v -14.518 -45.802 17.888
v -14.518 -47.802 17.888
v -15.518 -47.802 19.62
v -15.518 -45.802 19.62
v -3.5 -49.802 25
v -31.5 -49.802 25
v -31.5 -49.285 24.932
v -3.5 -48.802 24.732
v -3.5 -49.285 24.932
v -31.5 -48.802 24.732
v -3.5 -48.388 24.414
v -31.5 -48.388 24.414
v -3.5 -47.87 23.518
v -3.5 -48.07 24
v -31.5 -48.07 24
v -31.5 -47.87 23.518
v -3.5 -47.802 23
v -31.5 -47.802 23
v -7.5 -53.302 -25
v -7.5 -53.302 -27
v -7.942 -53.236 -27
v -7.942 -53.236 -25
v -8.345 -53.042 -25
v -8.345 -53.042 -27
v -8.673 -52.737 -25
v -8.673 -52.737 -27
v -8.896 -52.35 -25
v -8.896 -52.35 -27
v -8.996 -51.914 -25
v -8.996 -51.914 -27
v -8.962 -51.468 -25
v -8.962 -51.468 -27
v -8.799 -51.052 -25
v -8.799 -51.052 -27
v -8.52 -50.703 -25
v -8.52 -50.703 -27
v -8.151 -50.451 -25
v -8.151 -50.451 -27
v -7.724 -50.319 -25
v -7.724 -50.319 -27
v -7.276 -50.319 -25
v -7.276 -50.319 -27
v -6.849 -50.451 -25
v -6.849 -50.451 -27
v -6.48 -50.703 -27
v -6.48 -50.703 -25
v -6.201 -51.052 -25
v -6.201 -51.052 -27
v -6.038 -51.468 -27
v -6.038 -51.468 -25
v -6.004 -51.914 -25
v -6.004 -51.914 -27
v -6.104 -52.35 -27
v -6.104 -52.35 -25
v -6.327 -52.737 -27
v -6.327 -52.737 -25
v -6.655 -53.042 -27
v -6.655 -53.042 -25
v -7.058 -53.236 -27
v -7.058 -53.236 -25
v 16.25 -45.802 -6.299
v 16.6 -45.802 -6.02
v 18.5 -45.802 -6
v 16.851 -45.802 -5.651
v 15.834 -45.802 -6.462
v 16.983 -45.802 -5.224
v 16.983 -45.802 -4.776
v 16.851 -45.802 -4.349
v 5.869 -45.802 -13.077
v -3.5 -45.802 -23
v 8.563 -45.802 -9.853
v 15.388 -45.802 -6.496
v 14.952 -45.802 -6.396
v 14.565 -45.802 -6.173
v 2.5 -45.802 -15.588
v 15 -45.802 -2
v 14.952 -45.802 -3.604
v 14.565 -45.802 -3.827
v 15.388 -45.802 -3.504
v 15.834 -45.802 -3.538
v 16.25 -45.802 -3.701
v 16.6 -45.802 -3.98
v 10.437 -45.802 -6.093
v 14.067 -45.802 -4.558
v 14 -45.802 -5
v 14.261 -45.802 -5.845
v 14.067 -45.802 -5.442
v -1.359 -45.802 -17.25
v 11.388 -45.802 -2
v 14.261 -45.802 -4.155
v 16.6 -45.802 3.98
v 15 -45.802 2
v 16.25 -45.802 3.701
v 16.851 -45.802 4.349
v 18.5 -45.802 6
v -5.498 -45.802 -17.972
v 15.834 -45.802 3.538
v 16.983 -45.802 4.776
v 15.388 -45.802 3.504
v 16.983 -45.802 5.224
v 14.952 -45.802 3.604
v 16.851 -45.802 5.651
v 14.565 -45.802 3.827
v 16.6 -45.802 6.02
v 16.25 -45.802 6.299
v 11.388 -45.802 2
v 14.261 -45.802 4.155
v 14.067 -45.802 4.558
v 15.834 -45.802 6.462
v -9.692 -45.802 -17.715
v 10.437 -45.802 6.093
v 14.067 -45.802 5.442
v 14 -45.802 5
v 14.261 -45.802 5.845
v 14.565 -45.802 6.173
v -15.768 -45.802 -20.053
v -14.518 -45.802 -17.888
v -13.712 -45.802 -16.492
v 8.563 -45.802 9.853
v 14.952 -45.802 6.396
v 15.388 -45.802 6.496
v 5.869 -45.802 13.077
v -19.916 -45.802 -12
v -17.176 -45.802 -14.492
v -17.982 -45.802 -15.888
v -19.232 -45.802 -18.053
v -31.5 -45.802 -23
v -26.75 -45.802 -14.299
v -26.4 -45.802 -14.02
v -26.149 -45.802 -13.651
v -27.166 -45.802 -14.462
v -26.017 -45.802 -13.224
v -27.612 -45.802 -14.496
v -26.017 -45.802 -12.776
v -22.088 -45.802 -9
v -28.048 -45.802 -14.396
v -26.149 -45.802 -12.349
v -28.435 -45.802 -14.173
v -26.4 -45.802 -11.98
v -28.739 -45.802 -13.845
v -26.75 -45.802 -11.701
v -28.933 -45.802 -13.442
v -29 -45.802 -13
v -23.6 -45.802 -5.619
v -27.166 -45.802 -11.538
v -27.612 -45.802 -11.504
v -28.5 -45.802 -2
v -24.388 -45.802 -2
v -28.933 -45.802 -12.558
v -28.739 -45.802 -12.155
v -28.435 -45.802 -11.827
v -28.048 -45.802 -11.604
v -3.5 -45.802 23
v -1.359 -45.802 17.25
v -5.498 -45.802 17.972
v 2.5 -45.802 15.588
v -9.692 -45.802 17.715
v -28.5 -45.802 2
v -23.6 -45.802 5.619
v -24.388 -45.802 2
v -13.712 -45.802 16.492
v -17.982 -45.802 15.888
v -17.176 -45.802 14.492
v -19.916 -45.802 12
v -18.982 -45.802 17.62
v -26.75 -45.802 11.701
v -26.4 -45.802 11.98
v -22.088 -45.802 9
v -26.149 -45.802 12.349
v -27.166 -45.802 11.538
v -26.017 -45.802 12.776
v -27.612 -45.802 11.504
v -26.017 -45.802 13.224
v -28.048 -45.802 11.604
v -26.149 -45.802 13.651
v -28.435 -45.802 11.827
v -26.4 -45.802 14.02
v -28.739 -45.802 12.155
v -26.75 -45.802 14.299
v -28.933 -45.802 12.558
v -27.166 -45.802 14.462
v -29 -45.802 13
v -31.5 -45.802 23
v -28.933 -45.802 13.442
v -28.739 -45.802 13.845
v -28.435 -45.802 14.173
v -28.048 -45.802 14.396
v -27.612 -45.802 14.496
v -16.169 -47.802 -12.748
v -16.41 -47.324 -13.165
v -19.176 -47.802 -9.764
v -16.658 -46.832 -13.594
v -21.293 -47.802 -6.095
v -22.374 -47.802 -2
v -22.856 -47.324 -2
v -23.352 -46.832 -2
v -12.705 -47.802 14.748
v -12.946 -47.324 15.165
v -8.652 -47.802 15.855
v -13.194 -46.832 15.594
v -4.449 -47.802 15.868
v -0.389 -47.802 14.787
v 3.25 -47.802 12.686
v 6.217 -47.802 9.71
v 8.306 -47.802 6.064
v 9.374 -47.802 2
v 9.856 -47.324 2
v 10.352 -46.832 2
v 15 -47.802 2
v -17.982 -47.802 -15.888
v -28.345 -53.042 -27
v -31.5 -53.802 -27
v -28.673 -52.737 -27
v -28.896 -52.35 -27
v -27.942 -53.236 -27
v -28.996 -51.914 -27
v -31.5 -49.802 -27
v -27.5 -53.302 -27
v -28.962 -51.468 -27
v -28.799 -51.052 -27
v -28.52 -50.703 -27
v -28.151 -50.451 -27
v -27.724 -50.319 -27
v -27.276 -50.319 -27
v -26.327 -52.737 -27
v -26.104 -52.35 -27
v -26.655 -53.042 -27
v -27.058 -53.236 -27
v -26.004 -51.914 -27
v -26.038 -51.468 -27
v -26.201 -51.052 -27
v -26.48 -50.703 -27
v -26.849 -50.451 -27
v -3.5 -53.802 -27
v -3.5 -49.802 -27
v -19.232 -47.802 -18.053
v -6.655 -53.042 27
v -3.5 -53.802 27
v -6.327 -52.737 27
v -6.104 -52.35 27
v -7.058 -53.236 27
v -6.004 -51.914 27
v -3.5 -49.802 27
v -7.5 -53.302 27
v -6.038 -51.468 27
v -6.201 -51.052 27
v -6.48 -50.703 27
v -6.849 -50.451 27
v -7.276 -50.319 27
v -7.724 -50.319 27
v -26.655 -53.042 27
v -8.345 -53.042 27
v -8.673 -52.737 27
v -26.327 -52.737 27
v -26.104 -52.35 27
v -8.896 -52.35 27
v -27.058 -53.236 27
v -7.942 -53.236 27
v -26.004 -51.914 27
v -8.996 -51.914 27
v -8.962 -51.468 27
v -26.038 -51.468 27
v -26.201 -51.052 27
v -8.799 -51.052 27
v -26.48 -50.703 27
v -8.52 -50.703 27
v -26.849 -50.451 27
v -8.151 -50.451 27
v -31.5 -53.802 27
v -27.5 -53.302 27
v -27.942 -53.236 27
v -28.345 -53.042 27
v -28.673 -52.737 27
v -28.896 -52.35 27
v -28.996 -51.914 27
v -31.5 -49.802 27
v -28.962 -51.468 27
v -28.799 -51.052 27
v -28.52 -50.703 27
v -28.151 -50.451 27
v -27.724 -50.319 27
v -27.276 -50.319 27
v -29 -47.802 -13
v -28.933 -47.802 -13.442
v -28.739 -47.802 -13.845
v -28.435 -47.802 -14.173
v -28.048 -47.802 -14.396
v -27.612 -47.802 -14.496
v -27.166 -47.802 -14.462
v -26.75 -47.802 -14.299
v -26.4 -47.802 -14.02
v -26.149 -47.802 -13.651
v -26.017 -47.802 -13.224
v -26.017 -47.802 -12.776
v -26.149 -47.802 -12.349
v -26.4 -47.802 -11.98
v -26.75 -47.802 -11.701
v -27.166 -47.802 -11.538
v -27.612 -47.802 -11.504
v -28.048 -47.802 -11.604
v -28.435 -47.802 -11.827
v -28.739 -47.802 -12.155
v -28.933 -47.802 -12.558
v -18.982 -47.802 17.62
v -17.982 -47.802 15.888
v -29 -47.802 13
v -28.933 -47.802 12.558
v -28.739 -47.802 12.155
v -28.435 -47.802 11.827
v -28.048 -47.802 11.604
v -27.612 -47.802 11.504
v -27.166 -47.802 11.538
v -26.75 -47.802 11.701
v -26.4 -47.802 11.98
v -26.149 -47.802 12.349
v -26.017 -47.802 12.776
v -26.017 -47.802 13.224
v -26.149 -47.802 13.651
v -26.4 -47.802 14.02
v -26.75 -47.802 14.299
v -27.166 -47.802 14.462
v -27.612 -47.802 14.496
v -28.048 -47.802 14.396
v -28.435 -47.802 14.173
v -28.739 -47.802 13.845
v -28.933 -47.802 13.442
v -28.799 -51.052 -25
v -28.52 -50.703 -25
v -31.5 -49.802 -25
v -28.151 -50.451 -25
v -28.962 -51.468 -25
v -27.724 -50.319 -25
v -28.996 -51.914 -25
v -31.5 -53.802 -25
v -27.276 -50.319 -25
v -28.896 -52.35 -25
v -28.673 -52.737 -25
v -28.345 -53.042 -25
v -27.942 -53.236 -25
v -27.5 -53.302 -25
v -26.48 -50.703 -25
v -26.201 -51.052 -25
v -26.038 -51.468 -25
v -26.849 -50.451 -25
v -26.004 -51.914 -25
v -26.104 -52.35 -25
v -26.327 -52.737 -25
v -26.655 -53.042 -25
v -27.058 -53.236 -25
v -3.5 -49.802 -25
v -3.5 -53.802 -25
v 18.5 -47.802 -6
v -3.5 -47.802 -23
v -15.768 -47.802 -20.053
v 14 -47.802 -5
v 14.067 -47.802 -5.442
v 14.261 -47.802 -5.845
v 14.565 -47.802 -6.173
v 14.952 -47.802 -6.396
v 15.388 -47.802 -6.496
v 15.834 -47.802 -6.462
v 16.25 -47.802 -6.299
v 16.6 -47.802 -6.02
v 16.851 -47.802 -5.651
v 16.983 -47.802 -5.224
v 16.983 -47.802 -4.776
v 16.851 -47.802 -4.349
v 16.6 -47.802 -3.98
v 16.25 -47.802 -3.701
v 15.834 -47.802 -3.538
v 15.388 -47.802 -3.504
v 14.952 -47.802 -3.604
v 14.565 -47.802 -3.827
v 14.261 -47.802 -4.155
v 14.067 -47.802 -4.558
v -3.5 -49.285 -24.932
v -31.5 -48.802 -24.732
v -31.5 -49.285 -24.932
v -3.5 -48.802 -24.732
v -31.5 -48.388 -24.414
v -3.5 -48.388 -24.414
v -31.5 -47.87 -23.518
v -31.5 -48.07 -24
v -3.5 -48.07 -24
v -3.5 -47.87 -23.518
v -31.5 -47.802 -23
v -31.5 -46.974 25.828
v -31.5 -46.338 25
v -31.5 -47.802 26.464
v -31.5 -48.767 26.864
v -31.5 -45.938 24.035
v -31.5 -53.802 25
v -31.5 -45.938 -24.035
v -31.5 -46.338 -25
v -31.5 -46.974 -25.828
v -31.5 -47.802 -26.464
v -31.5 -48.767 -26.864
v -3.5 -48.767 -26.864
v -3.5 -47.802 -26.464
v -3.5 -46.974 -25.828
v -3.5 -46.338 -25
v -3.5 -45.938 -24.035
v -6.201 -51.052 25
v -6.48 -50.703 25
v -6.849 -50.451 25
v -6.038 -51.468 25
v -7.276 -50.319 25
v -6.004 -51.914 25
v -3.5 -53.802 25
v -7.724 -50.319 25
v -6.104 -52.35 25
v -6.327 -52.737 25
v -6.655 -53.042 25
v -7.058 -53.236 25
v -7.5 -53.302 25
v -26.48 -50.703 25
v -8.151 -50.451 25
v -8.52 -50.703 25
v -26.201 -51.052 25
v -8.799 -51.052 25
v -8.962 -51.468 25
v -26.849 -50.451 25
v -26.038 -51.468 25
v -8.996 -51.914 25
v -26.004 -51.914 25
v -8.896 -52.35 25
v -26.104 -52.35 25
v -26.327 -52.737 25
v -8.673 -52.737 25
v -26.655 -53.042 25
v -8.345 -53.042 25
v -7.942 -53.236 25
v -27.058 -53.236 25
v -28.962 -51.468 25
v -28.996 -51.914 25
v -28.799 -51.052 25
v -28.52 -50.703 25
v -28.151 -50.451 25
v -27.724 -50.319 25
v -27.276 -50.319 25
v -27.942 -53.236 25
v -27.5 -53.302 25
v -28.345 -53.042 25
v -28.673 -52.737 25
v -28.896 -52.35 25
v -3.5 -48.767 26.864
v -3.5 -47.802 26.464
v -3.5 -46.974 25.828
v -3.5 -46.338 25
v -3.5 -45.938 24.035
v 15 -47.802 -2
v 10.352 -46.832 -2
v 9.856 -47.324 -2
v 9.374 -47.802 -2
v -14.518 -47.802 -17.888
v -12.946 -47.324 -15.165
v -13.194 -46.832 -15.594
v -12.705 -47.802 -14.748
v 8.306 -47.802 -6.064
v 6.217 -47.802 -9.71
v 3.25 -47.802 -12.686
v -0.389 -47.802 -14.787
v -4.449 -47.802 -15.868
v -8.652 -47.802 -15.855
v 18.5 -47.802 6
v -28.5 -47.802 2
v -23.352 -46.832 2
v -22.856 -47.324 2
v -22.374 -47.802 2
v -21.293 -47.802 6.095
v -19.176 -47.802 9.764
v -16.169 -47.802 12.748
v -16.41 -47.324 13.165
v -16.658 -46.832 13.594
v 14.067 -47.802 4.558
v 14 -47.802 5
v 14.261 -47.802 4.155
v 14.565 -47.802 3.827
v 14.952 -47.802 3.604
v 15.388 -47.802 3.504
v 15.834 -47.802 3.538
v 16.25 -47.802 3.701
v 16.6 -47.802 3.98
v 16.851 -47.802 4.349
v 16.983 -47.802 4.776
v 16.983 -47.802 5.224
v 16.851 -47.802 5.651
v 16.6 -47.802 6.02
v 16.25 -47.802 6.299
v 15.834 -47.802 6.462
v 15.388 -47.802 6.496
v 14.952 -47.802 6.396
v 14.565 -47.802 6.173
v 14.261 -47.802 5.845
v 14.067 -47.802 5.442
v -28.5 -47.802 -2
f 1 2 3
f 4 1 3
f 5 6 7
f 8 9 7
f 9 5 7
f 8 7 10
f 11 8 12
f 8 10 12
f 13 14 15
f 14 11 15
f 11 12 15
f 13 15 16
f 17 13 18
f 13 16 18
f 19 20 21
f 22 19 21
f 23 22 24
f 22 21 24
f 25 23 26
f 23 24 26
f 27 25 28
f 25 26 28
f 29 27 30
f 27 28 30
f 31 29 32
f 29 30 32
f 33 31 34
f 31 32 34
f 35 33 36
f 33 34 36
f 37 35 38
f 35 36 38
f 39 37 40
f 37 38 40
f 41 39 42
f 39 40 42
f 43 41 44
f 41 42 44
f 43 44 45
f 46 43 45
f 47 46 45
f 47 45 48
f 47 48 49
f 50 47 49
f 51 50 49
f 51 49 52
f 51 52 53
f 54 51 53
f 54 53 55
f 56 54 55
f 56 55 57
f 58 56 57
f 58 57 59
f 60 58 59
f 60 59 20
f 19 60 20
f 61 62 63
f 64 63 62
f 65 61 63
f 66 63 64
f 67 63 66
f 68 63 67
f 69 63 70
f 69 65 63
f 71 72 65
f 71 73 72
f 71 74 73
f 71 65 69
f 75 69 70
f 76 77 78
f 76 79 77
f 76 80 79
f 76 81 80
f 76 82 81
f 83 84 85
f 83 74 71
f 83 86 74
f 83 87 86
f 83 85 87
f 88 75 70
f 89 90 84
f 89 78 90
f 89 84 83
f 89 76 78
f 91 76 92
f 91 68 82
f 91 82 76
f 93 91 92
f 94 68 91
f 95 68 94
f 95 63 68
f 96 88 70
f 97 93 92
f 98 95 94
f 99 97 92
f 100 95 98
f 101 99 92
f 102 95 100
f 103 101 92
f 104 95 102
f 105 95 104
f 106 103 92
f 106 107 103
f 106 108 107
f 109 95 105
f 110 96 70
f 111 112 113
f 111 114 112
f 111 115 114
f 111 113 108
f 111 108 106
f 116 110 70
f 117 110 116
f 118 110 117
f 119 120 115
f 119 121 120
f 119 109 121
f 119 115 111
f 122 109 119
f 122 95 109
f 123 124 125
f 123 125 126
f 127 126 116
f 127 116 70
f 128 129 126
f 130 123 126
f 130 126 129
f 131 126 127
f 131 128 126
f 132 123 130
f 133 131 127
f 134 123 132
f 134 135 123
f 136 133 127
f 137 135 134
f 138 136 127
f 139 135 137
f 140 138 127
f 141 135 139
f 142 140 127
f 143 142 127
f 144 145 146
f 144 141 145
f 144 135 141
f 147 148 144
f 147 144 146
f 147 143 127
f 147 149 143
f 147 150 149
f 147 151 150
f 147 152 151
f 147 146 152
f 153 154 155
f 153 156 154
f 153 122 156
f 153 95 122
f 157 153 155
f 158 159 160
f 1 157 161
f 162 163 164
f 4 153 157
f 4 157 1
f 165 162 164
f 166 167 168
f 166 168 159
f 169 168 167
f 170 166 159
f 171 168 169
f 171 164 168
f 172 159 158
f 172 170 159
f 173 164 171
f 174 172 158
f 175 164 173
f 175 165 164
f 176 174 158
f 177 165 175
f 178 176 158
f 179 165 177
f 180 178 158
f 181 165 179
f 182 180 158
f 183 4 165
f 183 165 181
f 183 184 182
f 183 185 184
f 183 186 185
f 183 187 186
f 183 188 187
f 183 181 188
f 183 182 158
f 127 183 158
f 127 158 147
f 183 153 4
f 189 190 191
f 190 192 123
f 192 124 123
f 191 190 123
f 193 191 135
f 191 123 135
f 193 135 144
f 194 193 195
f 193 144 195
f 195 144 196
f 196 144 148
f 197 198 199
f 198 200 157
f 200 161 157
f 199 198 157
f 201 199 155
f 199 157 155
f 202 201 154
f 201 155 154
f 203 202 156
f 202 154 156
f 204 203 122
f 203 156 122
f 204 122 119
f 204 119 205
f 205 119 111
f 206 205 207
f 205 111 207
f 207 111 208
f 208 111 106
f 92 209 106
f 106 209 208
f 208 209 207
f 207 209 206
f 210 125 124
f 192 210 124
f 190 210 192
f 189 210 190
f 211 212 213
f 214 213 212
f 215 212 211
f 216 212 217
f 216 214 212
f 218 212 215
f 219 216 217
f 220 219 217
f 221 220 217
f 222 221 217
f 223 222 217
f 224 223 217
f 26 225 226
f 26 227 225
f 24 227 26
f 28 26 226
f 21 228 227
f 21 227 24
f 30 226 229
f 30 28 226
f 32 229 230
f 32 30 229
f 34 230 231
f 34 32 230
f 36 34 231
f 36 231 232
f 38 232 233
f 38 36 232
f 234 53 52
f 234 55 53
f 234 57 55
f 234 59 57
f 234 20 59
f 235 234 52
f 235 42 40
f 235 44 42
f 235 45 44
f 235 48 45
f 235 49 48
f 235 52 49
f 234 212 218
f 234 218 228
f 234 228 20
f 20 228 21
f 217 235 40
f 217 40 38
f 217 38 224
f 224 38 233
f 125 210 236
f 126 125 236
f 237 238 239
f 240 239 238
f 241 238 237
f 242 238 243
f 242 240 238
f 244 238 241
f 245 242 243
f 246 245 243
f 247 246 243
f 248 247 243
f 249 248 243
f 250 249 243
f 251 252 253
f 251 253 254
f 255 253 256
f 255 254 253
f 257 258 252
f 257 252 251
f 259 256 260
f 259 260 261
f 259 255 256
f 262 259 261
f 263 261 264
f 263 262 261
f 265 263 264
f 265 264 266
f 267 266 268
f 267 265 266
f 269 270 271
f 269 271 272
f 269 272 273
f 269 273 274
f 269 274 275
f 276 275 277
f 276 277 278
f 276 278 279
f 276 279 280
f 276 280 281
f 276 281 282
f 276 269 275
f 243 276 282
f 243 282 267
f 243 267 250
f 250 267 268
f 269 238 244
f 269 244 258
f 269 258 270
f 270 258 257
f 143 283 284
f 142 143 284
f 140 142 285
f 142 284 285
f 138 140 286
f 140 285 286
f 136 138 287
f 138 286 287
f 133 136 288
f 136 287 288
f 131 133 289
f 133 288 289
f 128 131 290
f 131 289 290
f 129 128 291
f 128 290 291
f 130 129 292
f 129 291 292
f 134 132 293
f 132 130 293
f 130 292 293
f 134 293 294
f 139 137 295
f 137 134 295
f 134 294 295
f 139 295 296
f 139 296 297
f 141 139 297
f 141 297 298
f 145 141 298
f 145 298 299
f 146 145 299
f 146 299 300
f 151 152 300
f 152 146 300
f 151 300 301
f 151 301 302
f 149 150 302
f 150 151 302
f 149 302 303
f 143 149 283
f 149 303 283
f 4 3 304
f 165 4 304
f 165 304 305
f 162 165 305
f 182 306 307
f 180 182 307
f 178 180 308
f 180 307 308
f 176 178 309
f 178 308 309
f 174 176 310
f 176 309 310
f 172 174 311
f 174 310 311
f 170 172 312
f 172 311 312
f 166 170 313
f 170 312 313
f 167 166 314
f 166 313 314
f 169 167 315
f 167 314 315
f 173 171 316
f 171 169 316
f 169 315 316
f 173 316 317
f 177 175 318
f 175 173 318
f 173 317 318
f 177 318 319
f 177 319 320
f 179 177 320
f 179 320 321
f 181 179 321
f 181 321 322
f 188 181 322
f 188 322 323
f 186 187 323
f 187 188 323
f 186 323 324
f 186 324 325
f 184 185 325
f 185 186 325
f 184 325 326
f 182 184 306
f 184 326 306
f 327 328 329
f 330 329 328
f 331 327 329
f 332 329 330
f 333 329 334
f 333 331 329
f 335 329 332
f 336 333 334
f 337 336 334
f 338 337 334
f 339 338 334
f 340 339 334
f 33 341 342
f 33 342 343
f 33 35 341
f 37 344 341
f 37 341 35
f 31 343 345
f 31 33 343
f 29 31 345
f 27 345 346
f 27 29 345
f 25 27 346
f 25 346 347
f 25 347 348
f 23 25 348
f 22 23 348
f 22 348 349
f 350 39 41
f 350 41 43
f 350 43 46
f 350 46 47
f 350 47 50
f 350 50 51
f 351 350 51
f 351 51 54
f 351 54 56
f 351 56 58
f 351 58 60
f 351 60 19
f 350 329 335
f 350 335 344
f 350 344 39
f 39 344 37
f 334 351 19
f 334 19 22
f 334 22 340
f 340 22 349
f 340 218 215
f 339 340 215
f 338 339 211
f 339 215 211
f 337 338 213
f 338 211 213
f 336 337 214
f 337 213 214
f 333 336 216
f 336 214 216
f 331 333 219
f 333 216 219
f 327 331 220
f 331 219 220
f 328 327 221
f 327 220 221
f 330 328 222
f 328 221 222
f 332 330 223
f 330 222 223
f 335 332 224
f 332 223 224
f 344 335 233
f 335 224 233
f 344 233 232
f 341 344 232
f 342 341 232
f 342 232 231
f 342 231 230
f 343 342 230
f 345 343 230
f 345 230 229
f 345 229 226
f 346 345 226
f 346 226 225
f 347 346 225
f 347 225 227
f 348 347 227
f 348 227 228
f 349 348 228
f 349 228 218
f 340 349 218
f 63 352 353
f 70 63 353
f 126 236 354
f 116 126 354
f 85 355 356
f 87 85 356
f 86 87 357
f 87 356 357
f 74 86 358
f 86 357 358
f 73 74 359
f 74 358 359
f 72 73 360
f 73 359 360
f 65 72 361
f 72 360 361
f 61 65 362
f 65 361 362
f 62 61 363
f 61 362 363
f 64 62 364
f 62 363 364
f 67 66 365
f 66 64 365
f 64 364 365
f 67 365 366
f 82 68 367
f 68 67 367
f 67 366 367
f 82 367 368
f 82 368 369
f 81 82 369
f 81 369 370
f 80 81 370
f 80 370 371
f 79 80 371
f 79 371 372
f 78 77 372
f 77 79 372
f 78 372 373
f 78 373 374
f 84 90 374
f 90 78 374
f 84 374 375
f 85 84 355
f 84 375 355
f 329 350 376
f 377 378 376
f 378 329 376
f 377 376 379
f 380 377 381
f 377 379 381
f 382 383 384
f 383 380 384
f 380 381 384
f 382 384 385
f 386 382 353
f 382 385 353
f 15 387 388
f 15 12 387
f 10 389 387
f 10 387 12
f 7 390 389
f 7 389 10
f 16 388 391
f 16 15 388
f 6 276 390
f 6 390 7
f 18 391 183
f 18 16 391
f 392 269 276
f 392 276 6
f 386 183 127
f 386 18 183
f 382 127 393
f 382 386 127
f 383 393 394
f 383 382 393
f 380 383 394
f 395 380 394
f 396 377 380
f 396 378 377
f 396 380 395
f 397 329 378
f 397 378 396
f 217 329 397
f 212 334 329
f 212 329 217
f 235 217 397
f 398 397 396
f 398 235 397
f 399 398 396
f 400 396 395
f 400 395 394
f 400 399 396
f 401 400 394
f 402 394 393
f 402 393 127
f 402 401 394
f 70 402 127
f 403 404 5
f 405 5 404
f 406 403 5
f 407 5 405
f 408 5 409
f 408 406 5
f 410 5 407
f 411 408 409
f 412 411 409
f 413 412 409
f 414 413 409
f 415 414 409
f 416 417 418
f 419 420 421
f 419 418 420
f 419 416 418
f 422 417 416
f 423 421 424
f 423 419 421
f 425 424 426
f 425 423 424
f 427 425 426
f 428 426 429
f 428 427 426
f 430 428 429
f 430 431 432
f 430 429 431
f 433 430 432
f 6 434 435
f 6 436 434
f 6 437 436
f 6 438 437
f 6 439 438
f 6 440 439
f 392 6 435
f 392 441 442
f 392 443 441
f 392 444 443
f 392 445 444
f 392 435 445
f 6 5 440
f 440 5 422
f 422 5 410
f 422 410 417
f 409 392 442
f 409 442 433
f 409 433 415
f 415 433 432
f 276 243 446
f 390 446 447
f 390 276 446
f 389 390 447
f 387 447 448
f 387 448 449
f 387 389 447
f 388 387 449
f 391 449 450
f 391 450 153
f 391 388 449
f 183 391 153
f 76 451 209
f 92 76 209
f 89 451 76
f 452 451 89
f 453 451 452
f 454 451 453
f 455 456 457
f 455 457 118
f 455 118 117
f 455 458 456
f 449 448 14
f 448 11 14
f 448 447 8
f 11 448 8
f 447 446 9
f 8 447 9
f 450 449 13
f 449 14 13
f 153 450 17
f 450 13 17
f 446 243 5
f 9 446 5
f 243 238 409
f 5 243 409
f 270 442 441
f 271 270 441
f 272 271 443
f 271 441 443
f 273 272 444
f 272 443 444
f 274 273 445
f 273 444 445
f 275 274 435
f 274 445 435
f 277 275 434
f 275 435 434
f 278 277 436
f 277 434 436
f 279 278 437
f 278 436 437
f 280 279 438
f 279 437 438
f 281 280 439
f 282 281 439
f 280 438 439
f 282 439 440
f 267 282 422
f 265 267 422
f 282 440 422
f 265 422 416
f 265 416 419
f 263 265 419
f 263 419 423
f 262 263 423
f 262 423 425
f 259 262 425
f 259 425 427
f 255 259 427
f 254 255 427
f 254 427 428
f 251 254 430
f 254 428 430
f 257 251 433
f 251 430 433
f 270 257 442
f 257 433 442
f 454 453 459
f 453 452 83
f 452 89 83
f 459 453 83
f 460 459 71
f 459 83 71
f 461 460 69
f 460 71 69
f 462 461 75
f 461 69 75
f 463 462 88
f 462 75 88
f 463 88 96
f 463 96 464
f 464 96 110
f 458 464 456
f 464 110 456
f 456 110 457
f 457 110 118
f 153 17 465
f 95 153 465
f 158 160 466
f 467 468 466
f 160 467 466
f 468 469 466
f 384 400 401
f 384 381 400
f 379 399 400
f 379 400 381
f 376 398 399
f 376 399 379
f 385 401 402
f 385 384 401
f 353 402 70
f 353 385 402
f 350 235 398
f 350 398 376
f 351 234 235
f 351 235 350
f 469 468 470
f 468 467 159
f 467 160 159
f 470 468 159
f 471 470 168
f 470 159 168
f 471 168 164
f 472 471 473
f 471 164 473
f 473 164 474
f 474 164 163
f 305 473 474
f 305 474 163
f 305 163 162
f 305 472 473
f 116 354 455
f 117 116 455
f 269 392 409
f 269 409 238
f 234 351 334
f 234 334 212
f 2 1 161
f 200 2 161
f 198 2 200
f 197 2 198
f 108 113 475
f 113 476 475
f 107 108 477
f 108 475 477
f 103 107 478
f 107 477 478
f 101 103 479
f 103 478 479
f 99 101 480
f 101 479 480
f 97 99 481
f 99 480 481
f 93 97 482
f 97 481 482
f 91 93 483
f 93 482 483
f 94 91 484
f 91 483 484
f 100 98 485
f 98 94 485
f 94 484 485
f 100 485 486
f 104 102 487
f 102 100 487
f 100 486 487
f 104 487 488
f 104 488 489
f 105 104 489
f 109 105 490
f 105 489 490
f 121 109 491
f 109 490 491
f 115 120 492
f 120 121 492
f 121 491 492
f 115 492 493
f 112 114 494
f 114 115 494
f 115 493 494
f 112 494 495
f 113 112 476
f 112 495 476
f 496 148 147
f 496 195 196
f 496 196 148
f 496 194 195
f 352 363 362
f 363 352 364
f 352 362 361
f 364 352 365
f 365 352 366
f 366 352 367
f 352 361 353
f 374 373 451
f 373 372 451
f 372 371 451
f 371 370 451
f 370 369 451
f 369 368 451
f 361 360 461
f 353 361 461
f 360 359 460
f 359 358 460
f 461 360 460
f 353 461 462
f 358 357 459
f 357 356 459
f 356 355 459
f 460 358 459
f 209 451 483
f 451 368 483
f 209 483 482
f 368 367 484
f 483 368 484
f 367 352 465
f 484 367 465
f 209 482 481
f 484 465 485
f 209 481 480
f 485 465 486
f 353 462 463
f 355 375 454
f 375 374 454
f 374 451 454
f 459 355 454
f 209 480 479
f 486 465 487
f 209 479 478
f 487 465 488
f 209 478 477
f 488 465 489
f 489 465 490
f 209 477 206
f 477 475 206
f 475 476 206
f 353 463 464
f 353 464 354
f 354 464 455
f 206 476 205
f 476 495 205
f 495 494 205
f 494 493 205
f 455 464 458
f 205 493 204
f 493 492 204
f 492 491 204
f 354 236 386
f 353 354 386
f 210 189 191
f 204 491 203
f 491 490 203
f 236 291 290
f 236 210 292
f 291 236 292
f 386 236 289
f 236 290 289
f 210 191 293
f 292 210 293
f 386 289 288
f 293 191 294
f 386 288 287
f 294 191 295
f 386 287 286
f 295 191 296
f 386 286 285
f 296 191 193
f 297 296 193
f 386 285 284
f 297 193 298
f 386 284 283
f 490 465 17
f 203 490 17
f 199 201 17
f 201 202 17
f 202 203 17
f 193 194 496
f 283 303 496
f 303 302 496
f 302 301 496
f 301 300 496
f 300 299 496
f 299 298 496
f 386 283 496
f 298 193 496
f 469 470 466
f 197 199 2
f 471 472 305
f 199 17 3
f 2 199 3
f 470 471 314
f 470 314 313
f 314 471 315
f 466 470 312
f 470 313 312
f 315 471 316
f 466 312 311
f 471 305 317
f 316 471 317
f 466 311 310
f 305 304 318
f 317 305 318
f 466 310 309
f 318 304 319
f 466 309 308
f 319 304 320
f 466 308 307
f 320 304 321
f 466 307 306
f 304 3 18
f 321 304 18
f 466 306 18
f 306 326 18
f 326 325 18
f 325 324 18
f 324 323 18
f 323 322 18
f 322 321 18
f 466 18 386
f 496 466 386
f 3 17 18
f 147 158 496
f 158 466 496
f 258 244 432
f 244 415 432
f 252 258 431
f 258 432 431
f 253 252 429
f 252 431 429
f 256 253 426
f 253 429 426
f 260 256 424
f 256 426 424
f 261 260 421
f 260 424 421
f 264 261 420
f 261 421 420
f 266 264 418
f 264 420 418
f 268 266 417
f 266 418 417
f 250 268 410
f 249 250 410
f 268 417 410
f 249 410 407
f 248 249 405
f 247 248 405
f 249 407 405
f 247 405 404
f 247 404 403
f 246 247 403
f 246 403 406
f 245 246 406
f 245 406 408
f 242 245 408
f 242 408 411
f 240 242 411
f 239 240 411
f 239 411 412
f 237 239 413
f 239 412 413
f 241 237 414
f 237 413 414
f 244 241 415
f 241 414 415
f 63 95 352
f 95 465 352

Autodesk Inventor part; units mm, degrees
ref_plane "YZ Plane" through (0, 0, 0) normal (1, 0, 0) x (0, 1, 0)
ref_plane "XZ Plane" through (0, 0, 0) normal (0, 1, 0) x (-1, 0, 0)
ref_plane "XY Plane" through (0, 0, 0) normal (0, 0, 1) x (1, 0, 0)
ref_plane "作業平面1" through (-13.0598, -47.8022, -11.0593) normal (0, 1, 0) x (-1, 0, 0)
ref_plane "作業平面2" through (18.0823, -47.8022, -13) normal (0, 1, 0) x (-1, 0, 0)
sketch "スケッチ15" plane through (18.0823, -47.8022, -13) normal (0, 1, 0) x (-1, 0, 0)
  arc A0 (34.2516, 0.2523) -> (40.4568, 11) centre (24.5823, 13) ccw
  arc A1 (8.7078, 11) -> (30.7875, -1.7477) centre (24.5823, 13) ccw
  arc A2 (30.7875, 27.7477) -> (8.7078, 15) centre (24.5823, 13) ccw
  arc A3 (40.4568, 15) -> (34.2516, 25.7477) centre (24.5823, 13) ccw
  line L0 (46.5823, 11) -> (44.0823, 11)
  line L1 (44.0823, 15) -> (46.5823, 15)
  line L2 (37.0643, 30.6195) -> (36.0643, 28.8875)
  line L3 (32.6002, 30.8875) -> (33.6002, 32.6195)
  line L4 (3.0823, 15) -> (5.0823, 15)
  line L5 (5.0823, 11) -> (3.0823, 11)
  line L6 (3.0823, 11) -> (3.0823, 15)
  line L7 (46.5823, 15) -> (46.5823, 11)
  line L8 (33.6002, 32.6195) -> (37.0643, 30.6195)
  line L9 (37.3143, -5.0526) -> (33.8502, -7.0526)
  line L10 (33.8502, -7.0526) -> (32.6002, -4.8875)
  line L11 (36.0643, -2.8875) -> (37.3143, -5.0526)
  circle A4 centre (45.5823, 26) radius 1.5
  circle A5 centre (45.5823, 0) radius 1.5
  line L12 (21.5823, 36) -> (-0.4177, 19)
  line L13 (-0.4177, 19) -> (-0.4177, 7)
  line L14 (-0.4177, 7) -> (21.5823, -10)
  line L15 (49.5823, -4) -> (49.5823, 30)
  circle A6 centre (2.5823, 18) radius 1.5
  circle A7 centre (2.5823, 8) radius 1.5
  line L16 (5.0823, 11) -> (8.7078, 11)
  line L17 (5.0823, 15) -> (8.7078, 15)
  line L18 (36.0643, -2.8875) -> (34.2516, 0.2523)
  line L19 (30.7875, -1.7477) -> (32.6002, -4.8875)
  line L20 (40.4568, 11) -> (44.0823, 11)
  line L21 (44.0823, 15) -> (40.4568, 15)
  line L22 (34.2516, 25.7477) -> (36.0643, 28.8875)
  line L23 (32.6002, 30.8875) -> (30.7875, 27.7477)
  line L24 (49.5823, -4) -> (49.5823, -14)
  line L25 (49.5823, -14) -> (21.5823, -14)
  line L26 (21.5823, -14) -> (21.5823, -10)
  line L27 (21.5823, 36) -> (21.5823, 40)
  line L28 (21.5823, 40) -> (49.5823, 40)
  line L29 (49.5823, 40) -> (49.5823, 30)
  point P0 (18.0823, 13)
  dimension "d79" = 10
  dimension "d80" = 10
extrude "プレート6" add sketch "スケッチ15" along normal blind 2
chamfer "面取り4" distance 2 angle 45 4 edges at (-20.3564, -45.8022, -8) (-20.3564, -45.8022, 8) (1.5, -45.8022, 13.8564) (1.5, -45.8022, -13.8564)
sketch "スケッチ16" plane through (-31.5, -47.8022, 27) normal (0, 0, 1) x (1, 0, 0)
  point P0 (31.5, 47.8022)
sketch "スケッチ17" plane through (-31.5, -45.8022, 25) normal (0, 0, 1) x (1, 0, 0)
  line L0 (28, 0) -> (0, 0)
  line L1 (0, 0) -> (0, -8)
  line L2 (0, -8) -> (28, -8)
  line L3 (28, -8) -> (28, 0)
edge flange "フランジ2" height 8 angle 90 thickness 2 bend radius 2 thickness toward (0, 0, 1) relief straight relief width 2 relief depth 1 corner gap 2 corner form 0 edges at (-17.5, -47.8022, 27) (-17.5, -47.8022, -27) wall of the first edge with corners at (-3.5, -45.8022, 25) (-31.5, -45.8022, 25) (-31.5, -53.8022, 25) (-3.5, -53.8022, 25)
bend "曲げ2"
corner "コーナー2"
sketch "スケッチ18" plane through (-31.5, -53.8022, 27) normal (0, 0, 1) x (1, 0, 0)
  line L0 (28, 4) -> (28, 0) projected
  line L1 (0, 0) -> (0, 4) projected
  point P0 (31.5, 53.8022)
  point P1 (24, 2)
  point P2 (4, 2)
  point P3 (28, 2)
  point P4 (0, 2)
  dimension "d95" = 4
  dimension "d96" = 4
hole "穴4" at (-27.5, -51.8022, 27) at (-7.5, -51.8022, 27) direction (0, 0, -1) diameter 3 end through all
equation "\"d102\" = Thickness"
equation "\"d81\" = Thickness"
equation "\"d85\" = BendReliefWidth"
equation "\"d86\" = BendReliefDepth"
equation "\"d87\" = MinimumRemnant"
equation "\"d88\" = TransitionRadius"
equation "\"d91\" = BendRadius"
equation "\"d92\" = CornerReliefSize"
equation "\"d93\" = GapSize"
equation "\"d94\" = JacobiRadiusSize"
equation "\"BendRadius\" = Thickness"
equation "\"BendReliefWidth\" = Thickness"
equation "\"BendReliefDepth\" = 0.5 * Thickness"
equation "\"CornerReliefSize\" = 4 * Thickness"
equation "\"MinimumRemnant\" = 2 * Thickness"
equation "\"TransitionRadius\" = BendRadius"
equation "\"JacobiRadiusSize\" = Thickness"
equation "\"GapSize\" = Thickness"
equation "\"Thickness\" = 2"
properties part number "bearingcover" material "アルミニウム 6061"
